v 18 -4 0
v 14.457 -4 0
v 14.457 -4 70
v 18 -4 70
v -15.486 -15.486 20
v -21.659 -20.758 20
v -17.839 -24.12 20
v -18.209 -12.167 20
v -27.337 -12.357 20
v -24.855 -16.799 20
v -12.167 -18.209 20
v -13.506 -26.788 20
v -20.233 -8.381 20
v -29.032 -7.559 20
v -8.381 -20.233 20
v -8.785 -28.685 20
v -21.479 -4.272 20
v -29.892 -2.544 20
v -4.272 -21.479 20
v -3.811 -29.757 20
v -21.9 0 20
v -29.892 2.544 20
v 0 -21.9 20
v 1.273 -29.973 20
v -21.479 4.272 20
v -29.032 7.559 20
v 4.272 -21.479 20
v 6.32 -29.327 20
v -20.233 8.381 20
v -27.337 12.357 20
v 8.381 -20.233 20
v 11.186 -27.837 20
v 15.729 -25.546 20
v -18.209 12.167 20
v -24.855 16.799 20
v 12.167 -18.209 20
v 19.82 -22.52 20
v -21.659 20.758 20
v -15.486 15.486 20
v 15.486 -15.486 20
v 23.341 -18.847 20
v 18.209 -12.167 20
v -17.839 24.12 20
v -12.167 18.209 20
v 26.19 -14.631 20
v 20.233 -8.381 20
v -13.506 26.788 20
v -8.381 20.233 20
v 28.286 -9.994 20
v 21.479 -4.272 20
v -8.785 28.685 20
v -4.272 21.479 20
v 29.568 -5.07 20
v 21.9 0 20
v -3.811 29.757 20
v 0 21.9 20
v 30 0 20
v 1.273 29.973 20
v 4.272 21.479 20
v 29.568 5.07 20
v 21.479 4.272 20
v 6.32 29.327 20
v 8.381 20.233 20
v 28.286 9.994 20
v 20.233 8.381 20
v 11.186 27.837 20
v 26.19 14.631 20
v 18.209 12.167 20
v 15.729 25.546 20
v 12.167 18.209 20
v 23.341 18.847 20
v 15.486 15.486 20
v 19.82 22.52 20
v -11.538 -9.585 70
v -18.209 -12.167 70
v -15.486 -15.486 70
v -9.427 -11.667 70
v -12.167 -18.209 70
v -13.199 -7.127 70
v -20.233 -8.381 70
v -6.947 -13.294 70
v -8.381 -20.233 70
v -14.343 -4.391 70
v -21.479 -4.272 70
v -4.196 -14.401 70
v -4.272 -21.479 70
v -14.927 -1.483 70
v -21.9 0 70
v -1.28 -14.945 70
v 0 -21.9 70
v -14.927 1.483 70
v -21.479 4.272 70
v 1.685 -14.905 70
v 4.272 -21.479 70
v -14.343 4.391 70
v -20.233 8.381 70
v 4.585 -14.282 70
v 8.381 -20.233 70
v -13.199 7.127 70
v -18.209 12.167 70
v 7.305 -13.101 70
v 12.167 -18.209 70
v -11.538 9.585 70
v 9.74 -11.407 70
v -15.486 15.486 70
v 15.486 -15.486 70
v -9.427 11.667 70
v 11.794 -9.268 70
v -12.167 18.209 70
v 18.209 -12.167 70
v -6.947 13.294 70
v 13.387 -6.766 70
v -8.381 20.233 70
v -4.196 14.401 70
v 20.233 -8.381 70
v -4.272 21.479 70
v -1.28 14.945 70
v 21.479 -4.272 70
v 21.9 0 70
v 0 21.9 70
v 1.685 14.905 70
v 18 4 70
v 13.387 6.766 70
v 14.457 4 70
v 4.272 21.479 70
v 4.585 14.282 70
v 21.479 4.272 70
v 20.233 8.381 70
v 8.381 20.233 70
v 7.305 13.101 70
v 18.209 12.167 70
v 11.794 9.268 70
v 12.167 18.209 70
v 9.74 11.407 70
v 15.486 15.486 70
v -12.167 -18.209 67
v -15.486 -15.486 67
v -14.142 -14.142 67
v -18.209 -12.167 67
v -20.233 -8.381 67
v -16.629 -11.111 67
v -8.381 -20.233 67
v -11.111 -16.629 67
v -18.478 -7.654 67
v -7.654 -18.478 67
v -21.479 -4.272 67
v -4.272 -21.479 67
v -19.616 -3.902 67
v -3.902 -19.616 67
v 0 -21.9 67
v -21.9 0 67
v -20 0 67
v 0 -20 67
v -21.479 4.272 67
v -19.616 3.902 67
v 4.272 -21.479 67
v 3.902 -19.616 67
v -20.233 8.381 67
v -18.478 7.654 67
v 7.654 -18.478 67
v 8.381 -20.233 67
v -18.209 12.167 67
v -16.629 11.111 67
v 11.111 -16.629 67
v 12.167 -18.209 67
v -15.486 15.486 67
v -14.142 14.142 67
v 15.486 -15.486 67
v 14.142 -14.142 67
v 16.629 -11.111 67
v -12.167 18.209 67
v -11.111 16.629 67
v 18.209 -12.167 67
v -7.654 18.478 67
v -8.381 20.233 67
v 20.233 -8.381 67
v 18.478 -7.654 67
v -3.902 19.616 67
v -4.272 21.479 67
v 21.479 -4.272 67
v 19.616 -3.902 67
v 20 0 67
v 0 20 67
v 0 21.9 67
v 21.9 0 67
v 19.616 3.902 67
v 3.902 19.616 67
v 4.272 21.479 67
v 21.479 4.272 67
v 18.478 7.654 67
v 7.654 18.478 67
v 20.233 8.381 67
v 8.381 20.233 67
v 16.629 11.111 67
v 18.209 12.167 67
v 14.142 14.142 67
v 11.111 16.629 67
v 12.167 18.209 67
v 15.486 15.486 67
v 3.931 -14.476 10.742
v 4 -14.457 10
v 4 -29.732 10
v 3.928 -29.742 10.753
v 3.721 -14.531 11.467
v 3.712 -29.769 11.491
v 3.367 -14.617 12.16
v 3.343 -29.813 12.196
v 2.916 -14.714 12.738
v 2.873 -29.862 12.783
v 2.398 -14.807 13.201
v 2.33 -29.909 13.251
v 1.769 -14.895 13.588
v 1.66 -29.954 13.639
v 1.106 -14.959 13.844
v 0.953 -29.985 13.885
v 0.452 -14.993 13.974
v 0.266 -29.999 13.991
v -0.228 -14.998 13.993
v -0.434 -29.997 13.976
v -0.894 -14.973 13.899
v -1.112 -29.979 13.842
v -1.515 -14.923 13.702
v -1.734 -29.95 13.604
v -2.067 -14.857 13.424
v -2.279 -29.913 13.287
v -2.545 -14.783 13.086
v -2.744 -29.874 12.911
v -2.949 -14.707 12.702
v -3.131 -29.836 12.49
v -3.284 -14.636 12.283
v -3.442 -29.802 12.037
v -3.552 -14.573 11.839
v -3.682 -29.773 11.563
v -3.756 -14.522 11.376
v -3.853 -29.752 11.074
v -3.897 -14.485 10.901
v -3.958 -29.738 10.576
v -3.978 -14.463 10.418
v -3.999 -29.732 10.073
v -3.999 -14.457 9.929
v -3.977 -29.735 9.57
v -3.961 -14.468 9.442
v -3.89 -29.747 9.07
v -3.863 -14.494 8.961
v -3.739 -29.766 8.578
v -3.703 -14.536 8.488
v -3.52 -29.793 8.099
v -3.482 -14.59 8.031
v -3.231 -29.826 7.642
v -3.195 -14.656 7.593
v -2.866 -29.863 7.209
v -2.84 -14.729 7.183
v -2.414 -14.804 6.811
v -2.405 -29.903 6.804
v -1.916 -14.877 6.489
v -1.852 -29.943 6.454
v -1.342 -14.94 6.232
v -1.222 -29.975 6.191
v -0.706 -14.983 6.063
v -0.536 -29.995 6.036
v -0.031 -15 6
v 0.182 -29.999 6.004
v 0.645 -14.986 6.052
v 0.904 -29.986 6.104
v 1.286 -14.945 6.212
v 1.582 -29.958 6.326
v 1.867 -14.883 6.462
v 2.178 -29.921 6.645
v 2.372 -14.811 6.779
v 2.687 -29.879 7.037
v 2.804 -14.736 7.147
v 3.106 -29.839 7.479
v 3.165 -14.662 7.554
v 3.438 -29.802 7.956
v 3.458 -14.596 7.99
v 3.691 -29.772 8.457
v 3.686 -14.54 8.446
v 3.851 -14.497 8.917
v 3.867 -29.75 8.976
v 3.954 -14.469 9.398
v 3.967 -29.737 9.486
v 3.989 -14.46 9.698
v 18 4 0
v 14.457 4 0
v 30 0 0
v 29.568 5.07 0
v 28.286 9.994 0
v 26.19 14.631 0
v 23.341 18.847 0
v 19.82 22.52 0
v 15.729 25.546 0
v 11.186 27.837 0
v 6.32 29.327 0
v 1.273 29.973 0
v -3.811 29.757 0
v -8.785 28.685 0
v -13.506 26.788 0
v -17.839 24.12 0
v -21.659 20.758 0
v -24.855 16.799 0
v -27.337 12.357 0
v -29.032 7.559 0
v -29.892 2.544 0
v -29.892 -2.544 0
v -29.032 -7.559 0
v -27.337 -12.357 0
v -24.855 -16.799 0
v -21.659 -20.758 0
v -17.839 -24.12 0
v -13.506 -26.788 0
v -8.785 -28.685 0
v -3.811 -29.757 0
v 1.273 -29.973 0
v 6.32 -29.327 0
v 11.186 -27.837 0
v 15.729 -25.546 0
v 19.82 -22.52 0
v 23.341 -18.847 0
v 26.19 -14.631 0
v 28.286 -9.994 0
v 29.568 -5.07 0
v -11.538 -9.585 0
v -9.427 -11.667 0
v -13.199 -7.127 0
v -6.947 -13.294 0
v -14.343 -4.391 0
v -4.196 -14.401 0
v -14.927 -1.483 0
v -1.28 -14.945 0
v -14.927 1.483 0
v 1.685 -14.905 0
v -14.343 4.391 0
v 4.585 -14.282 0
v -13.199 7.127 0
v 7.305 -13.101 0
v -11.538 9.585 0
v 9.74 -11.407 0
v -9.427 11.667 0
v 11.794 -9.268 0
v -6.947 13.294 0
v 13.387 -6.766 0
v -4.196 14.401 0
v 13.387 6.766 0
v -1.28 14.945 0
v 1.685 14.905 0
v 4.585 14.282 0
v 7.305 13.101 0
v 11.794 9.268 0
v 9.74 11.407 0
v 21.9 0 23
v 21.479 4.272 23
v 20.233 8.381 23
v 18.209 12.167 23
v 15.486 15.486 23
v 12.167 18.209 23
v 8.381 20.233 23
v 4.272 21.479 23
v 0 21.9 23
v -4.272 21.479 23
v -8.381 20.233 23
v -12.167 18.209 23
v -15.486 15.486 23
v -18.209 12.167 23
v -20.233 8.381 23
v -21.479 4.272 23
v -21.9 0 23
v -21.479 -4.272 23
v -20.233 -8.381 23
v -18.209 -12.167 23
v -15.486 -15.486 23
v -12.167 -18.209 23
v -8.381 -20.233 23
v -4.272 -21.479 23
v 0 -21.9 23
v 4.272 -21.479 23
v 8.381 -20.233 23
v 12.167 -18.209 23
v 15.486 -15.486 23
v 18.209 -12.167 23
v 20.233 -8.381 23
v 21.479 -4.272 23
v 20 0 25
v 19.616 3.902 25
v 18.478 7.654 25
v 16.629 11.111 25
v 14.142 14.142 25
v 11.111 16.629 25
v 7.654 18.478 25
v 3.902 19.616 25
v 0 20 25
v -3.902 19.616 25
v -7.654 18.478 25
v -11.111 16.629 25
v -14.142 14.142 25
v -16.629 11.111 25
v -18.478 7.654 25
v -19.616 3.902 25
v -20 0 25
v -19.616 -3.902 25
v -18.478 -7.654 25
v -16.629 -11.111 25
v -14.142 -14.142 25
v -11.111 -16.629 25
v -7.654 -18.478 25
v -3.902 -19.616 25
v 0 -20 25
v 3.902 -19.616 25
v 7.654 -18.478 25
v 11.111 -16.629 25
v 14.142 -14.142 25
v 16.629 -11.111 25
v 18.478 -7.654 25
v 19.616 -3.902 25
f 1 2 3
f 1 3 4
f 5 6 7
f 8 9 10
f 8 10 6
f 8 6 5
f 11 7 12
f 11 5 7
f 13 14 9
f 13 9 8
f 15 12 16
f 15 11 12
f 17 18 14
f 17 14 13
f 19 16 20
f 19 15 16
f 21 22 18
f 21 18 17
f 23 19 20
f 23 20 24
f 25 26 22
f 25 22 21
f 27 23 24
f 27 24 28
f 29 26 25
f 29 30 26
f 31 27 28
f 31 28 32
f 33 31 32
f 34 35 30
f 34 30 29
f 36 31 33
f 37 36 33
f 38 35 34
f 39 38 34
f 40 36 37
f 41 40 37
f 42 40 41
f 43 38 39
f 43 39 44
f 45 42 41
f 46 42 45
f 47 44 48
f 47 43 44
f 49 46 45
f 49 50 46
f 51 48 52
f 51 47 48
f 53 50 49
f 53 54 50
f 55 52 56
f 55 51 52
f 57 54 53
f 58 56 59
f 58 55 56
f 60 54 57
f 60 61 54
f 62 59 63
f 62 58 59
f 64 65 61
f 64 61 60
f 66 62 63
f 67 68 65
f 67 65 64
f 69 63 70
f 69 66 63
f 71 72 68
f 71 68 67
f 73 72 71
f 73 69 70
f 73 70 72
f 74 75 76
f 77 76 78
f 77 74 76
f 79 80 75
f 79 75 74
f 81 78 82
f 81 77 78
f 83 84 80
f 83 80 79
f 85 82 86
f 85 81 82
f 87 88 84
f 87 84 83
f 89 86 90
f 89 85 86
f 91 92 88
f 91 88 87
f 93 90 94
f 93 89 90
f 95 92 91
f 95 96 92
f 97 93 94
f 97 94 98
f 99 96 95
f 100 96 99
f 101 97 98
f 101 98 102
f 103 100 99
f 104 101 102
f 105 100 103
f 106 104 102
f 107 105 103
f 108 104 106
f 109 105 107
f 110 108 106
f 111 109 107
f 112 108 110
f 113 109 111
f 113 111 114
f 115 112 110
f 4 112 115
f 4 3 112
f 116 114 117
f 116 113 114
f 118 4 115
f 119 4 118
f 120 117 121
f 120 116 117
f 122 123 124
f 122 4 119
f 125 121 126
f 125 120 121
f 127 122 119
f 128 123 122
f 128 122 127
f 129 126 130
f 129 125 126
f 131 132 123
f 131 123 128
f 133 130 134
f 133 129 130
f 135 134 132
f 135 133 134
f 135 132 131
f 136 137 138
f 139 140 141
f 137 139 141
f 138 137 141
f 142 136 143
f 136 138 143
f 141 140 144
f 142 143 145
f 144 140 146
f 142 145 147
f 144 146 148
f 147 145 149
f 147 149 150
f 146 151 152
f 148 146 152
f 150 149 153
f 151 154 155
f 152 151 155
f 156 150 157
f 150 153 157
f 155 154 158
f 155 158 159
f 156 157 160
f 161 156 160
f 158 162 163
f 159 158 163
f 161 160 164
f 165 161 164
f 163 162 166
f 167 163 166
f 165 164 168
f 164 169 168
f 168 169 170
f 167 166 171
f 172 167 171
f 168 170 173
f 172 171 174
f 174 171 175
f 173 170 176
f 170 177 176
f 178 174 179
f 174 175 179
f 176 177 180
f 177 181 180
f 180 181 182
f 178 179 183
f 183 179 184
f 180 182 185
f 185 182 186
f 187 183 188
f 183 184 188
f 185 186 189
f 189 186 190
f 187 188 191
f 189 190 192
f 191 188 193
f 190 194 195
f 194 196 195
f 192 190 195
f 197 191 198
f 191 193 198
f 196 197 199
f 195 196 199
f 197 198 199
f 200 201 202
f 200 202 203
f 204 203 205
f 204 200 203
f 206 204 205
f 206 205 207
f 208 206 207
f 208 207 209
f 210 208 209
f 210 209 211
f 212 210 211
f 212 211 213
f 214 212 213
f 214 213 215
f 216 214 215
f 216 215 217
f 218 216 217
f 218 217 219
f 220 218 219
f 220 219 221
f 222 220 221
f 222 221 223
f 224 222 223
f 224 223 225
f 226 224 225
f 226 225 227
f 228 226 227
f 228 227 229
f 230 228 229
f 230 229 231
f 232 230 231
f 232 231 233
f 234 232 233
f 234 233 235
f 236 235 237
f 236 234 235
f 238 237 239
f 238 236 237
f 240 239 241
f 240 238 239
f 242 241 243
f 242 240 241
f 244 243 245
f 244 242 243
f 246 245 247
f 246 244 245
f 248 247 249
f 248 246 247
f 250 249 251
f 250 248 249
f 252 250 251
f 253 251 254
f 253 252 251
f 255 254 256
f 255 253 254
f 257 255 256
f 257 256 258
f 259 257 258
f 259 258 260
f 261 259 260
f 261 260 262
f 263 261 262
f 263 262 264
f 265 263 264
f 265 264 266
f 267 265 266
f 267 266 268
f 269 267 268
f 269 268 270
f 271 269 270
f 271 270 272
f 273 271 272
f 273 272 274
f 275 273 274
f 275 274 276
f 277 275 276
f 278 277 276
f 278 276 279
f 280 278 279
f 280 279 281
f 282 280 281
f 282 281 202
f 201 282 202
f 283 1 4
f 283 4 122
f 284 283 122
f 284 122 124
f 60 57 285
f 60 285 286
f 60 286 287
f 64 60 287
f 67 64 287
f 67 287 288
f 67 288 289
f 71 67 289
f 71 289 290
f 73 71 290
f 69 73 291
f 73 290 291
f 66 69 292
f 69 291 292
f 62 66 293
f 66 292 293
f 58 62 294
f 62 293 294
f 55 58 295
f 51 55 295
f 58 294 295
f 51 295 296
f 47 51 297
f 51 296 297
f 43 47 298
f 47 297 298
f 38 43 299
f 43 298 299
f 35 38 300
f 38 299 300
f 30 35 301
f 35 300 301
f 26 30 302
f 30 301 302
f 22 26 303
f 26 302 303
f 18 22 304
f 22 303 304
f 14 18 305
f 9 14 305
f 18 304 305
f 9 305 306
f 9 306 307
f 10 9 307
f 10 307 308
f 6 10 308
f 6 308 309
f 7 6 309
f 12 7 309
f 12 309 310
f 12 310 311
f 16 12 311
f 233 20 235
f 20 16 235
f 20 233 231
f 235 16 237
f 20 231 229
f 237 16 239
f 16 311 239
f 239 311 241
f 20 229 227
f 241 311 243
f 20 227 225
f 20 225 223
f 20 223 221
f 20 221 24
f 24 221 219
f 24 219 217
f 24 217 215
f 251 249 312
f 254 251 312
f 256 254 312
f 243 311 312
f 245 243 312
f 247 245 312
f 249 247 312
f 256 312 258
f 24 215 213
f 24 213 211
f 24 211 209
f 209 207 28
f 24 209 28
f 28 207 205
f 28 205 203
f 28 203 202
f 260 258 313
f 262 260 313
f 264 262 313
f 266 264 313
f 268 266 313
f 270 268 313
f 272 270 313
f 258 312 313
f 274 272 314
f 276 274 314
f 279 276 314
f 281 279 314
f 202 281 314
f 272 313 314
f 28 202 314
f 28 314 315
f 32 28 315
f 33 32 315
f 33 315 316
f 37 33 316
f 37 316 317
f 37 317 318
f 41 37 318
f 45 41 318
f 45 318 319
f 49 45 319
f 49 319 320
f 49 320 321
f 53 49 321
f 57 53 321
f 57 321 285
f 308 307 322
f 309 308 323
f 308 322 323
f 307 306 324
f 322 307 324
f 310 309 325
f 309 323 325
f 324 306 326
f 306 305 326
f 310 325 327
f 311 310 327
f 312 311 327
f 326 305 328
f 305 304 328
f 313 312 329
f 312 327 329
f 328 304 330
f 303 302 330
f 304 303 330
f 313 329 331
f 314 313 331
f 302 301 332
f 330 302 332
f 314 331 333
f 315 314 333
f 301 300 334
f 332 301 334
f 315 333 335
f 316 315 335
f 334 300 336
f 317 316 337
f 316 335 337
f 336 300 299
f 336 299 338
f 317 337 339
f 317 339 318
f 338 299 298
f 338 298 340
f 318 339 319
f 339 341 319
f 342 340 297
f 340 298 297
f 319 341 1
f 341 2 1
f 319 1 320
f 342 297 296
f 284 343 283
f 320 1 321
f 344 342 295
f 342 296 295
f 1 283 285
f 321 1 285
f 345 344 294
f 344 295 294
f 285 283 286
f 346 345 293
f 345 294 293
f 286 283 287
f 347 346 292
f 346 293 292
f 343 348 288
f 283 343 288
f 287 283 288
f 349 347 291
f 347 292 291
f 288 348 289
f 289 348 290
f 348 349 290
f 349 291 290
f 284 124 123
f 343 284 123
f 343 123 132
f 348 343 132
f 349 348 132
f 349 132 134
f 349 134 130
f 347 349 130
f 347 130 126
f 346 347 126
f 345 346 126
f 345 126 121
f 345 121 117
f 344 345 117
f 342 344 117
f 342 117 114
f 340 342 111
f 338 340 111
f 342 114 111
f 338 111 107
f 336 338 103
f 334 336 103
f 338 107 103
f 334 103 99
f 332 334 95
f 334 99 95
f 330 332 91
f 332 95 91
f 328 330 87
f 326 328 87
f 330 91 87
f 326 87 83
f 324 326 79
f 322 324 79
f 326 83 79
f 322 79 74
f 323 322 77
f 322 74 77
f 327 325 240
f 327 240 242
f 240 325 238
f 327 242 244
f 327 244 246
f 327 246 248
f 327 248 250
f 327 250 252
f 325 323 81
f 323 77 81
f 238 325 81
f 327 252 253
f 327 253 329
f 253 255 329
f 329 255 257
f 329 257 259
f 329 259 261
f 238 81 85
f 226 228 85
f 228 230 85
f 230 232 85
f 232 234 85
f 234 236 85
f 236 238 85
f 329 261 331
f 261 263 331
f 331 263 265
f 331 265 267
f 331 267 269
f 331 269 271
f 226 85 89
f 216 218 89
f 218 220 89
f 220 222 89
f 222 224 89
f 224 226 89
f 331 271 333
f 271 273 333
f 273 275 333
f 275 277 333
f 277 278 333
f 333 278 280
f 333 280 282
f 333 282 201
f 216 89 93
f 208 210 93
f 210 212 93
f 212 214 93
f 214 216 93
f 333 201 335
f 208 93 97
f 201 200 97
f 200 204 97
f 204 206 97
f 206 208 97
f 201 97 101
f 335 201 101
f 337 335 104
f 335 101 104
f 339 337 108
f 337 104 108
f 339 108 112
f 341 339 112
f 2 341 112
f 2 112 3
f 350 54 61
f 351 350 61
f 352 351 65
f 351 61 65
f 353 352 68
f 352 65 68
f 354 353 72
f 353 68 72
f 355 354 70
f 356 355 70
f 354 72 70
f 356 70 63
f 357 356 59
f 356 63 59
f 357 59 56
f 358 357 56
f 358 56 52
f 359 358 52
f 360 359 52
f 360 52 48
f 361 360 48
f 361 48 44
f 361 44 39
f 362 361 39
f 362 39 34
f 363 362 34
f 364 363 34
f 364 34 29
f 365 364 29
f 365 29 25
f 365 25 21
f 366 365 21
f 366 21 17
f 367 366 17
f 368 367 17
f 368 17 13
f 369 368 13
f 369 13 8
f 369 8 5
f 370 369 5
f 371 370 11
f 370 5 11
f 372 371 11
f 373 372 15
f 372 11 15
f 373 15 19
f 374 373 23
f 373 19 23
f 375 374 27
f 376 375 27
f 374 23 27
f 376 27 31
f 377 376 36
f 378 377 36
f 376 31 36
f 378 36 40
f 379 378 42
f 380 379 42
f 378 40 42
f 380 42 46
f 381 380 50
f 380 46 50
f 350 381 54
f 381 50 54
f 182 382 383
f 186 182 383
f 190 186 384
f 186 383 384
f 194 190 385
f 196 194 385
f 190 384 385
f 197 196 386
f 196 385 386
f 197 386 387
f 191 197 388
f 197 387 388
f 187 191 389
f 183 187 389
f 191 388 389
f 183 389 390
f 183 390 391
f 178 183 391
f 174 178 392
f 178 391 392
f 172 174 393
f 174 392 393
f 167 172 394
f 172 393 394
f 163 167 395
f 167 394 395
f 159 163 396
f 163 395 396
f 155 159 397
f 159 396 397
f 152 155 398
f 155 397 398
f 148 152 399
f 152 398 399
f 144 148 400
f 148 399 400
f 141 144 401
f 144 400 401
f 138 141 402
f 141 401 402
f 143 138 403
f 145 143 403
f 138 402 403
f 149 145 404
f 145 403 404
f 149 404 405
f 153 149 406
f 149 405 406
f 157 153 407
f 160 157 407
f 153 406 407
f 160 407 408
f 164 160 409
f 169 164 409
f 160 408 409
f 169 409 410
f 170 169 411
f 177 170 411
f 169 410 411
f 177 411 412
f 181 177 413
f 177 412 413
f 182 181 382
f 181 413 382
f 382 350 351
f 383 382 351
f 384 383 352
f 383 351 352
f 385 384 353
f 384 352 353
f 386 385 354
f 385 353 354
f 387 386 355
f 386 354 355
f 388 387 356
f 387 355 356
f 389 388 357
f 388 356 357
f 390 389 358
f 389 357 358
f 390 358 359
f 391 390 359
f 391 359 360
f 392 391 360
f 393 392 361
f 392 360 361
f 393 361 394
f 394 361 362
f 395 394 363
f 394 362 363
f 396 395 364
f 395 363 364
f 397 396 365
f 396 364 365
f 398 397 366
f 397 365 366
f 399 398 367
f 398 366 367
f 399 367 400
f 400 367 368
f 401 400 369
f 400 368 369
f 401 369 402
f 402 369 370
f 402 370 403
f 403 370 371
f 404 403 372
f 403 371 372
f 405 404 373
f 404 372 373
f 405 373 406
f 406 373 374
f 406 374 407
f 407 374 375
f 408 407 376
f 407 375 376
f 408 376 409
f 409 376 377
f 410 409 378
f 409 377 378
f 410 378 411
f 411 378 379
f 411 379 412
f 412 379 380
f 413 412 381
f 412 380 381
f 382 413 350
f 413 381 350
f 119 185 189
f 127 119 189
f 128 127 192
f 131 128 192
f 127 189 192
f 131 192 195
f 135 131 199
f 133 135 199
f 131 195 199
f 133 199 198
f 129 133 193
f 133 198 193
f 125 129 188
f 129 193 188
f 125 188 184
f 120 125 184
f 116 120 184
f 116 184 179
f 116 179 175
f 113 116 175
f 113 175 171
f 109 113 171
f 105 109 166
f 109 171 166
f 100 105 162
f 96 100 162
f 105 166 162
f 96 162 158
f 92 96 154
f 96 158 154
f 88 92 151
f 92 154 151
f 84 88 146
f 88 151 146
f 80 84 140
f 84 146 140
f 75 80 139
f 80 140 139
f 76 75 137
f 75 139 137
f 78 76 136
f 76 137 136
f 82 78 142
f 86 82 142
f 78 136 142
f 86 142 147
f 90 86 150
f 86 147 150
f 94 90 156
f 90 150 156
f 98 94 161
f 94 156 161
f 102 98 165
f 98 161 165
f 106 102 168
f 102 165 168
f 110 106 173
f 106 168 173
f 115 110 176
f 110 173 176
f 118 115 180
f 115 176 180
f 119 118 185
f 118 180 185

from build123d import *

# Parameters (mm, degrees)
F0_R      = 30
F1_DEPTH  = 20
F3_R      = 21.9
F4_DEPTH  = 3
F6_R      = 21.9
F7_DEPTH  = 2
F9_R      = 20
F10_DEPTH = 42
F11_SIZE2 = 1.99999
F11_SIZE  = 1.89999
F12_R     = 21.9
F13_DEPTH = 3
F15_DEPTH = 78
F16_R     = 4
F17_DEPTH = 45


# Not quite as in the source:
# - a fillet or chamfer is up to 0.001 mm smaller than in the source, because OpenCascade refuses the exact size


with BuildPart() as f1:
    # F0 (on Top) → F1 (new body)
    with BuildSketch(Plane.XY):
        Circle(F0_R)
    extrude(amount=F1_DEPTH)

    # F3 (on offset) → F4 (join)
    with BuildSketch(Plane.XY.offset(20)):
        Circle(F3_R)
    extrude(amount=F4_DEPTH)

    # F6 (on offset) → F7 (join)
    with BuildSketch(Plane.XY.offset(23)):
        Circle(F6_R)
    extrude(amount=F7_DEPTH)

    # F9 (on offset) → F10 (join)
    with BuildSketch(Plane.XY.offset(25)):
        Circle(F9_R)
    extrude(amount=F10_DEPTH)

    # F11 (size 1.9 and 2 in the source; OpenCascade refuses exactly that, so slightly less here)
    f11_edges = [f1.edges().sort_by_distance(p)[0] for p in [
        (-21.9, 0, 25),
    ]]
    f11_side = f1.faces().sort_by_distance((-21.280574, 0, 25))[0]
    chamfer(f11_edges, length=F11_SIZE, length2=F11_SIZE2, reference=f11_side)

    # F12 (on face) → F13 (join)
    with BuildSketch(Plane.XY.offset(67)):
        Circle(F12_R)
    extrude(amount=F13_DEPTH)

    # F14 (on face) → F15 (cut)
    with BuildSketch(Plane.XY.offset(70)):
        with BuildLine():
            Line((18, 4), (14.4568322948, 4))
            ThreePointArc((14.4568322948, 4), (-15, 0), (14.4568322948, -4))
            Line((14.4568322948, -4), (18, -4))
            Line((18, -4), (18, 0))
            Line((18, 0), (18, 4))
        make_face()
    extrude(amount=-F15_DEPTH, mode=Mode.SUBTRACT)

    # F16 (on Front) → F17 (cut)
    with BuildSketch(Plane.XZ):
        with Locations((0, 10)):
            Circle(F16_R)
    extrude(amount=F17_DEPTH, mode=Mode.SUBTRACT)


solid = f1.part
